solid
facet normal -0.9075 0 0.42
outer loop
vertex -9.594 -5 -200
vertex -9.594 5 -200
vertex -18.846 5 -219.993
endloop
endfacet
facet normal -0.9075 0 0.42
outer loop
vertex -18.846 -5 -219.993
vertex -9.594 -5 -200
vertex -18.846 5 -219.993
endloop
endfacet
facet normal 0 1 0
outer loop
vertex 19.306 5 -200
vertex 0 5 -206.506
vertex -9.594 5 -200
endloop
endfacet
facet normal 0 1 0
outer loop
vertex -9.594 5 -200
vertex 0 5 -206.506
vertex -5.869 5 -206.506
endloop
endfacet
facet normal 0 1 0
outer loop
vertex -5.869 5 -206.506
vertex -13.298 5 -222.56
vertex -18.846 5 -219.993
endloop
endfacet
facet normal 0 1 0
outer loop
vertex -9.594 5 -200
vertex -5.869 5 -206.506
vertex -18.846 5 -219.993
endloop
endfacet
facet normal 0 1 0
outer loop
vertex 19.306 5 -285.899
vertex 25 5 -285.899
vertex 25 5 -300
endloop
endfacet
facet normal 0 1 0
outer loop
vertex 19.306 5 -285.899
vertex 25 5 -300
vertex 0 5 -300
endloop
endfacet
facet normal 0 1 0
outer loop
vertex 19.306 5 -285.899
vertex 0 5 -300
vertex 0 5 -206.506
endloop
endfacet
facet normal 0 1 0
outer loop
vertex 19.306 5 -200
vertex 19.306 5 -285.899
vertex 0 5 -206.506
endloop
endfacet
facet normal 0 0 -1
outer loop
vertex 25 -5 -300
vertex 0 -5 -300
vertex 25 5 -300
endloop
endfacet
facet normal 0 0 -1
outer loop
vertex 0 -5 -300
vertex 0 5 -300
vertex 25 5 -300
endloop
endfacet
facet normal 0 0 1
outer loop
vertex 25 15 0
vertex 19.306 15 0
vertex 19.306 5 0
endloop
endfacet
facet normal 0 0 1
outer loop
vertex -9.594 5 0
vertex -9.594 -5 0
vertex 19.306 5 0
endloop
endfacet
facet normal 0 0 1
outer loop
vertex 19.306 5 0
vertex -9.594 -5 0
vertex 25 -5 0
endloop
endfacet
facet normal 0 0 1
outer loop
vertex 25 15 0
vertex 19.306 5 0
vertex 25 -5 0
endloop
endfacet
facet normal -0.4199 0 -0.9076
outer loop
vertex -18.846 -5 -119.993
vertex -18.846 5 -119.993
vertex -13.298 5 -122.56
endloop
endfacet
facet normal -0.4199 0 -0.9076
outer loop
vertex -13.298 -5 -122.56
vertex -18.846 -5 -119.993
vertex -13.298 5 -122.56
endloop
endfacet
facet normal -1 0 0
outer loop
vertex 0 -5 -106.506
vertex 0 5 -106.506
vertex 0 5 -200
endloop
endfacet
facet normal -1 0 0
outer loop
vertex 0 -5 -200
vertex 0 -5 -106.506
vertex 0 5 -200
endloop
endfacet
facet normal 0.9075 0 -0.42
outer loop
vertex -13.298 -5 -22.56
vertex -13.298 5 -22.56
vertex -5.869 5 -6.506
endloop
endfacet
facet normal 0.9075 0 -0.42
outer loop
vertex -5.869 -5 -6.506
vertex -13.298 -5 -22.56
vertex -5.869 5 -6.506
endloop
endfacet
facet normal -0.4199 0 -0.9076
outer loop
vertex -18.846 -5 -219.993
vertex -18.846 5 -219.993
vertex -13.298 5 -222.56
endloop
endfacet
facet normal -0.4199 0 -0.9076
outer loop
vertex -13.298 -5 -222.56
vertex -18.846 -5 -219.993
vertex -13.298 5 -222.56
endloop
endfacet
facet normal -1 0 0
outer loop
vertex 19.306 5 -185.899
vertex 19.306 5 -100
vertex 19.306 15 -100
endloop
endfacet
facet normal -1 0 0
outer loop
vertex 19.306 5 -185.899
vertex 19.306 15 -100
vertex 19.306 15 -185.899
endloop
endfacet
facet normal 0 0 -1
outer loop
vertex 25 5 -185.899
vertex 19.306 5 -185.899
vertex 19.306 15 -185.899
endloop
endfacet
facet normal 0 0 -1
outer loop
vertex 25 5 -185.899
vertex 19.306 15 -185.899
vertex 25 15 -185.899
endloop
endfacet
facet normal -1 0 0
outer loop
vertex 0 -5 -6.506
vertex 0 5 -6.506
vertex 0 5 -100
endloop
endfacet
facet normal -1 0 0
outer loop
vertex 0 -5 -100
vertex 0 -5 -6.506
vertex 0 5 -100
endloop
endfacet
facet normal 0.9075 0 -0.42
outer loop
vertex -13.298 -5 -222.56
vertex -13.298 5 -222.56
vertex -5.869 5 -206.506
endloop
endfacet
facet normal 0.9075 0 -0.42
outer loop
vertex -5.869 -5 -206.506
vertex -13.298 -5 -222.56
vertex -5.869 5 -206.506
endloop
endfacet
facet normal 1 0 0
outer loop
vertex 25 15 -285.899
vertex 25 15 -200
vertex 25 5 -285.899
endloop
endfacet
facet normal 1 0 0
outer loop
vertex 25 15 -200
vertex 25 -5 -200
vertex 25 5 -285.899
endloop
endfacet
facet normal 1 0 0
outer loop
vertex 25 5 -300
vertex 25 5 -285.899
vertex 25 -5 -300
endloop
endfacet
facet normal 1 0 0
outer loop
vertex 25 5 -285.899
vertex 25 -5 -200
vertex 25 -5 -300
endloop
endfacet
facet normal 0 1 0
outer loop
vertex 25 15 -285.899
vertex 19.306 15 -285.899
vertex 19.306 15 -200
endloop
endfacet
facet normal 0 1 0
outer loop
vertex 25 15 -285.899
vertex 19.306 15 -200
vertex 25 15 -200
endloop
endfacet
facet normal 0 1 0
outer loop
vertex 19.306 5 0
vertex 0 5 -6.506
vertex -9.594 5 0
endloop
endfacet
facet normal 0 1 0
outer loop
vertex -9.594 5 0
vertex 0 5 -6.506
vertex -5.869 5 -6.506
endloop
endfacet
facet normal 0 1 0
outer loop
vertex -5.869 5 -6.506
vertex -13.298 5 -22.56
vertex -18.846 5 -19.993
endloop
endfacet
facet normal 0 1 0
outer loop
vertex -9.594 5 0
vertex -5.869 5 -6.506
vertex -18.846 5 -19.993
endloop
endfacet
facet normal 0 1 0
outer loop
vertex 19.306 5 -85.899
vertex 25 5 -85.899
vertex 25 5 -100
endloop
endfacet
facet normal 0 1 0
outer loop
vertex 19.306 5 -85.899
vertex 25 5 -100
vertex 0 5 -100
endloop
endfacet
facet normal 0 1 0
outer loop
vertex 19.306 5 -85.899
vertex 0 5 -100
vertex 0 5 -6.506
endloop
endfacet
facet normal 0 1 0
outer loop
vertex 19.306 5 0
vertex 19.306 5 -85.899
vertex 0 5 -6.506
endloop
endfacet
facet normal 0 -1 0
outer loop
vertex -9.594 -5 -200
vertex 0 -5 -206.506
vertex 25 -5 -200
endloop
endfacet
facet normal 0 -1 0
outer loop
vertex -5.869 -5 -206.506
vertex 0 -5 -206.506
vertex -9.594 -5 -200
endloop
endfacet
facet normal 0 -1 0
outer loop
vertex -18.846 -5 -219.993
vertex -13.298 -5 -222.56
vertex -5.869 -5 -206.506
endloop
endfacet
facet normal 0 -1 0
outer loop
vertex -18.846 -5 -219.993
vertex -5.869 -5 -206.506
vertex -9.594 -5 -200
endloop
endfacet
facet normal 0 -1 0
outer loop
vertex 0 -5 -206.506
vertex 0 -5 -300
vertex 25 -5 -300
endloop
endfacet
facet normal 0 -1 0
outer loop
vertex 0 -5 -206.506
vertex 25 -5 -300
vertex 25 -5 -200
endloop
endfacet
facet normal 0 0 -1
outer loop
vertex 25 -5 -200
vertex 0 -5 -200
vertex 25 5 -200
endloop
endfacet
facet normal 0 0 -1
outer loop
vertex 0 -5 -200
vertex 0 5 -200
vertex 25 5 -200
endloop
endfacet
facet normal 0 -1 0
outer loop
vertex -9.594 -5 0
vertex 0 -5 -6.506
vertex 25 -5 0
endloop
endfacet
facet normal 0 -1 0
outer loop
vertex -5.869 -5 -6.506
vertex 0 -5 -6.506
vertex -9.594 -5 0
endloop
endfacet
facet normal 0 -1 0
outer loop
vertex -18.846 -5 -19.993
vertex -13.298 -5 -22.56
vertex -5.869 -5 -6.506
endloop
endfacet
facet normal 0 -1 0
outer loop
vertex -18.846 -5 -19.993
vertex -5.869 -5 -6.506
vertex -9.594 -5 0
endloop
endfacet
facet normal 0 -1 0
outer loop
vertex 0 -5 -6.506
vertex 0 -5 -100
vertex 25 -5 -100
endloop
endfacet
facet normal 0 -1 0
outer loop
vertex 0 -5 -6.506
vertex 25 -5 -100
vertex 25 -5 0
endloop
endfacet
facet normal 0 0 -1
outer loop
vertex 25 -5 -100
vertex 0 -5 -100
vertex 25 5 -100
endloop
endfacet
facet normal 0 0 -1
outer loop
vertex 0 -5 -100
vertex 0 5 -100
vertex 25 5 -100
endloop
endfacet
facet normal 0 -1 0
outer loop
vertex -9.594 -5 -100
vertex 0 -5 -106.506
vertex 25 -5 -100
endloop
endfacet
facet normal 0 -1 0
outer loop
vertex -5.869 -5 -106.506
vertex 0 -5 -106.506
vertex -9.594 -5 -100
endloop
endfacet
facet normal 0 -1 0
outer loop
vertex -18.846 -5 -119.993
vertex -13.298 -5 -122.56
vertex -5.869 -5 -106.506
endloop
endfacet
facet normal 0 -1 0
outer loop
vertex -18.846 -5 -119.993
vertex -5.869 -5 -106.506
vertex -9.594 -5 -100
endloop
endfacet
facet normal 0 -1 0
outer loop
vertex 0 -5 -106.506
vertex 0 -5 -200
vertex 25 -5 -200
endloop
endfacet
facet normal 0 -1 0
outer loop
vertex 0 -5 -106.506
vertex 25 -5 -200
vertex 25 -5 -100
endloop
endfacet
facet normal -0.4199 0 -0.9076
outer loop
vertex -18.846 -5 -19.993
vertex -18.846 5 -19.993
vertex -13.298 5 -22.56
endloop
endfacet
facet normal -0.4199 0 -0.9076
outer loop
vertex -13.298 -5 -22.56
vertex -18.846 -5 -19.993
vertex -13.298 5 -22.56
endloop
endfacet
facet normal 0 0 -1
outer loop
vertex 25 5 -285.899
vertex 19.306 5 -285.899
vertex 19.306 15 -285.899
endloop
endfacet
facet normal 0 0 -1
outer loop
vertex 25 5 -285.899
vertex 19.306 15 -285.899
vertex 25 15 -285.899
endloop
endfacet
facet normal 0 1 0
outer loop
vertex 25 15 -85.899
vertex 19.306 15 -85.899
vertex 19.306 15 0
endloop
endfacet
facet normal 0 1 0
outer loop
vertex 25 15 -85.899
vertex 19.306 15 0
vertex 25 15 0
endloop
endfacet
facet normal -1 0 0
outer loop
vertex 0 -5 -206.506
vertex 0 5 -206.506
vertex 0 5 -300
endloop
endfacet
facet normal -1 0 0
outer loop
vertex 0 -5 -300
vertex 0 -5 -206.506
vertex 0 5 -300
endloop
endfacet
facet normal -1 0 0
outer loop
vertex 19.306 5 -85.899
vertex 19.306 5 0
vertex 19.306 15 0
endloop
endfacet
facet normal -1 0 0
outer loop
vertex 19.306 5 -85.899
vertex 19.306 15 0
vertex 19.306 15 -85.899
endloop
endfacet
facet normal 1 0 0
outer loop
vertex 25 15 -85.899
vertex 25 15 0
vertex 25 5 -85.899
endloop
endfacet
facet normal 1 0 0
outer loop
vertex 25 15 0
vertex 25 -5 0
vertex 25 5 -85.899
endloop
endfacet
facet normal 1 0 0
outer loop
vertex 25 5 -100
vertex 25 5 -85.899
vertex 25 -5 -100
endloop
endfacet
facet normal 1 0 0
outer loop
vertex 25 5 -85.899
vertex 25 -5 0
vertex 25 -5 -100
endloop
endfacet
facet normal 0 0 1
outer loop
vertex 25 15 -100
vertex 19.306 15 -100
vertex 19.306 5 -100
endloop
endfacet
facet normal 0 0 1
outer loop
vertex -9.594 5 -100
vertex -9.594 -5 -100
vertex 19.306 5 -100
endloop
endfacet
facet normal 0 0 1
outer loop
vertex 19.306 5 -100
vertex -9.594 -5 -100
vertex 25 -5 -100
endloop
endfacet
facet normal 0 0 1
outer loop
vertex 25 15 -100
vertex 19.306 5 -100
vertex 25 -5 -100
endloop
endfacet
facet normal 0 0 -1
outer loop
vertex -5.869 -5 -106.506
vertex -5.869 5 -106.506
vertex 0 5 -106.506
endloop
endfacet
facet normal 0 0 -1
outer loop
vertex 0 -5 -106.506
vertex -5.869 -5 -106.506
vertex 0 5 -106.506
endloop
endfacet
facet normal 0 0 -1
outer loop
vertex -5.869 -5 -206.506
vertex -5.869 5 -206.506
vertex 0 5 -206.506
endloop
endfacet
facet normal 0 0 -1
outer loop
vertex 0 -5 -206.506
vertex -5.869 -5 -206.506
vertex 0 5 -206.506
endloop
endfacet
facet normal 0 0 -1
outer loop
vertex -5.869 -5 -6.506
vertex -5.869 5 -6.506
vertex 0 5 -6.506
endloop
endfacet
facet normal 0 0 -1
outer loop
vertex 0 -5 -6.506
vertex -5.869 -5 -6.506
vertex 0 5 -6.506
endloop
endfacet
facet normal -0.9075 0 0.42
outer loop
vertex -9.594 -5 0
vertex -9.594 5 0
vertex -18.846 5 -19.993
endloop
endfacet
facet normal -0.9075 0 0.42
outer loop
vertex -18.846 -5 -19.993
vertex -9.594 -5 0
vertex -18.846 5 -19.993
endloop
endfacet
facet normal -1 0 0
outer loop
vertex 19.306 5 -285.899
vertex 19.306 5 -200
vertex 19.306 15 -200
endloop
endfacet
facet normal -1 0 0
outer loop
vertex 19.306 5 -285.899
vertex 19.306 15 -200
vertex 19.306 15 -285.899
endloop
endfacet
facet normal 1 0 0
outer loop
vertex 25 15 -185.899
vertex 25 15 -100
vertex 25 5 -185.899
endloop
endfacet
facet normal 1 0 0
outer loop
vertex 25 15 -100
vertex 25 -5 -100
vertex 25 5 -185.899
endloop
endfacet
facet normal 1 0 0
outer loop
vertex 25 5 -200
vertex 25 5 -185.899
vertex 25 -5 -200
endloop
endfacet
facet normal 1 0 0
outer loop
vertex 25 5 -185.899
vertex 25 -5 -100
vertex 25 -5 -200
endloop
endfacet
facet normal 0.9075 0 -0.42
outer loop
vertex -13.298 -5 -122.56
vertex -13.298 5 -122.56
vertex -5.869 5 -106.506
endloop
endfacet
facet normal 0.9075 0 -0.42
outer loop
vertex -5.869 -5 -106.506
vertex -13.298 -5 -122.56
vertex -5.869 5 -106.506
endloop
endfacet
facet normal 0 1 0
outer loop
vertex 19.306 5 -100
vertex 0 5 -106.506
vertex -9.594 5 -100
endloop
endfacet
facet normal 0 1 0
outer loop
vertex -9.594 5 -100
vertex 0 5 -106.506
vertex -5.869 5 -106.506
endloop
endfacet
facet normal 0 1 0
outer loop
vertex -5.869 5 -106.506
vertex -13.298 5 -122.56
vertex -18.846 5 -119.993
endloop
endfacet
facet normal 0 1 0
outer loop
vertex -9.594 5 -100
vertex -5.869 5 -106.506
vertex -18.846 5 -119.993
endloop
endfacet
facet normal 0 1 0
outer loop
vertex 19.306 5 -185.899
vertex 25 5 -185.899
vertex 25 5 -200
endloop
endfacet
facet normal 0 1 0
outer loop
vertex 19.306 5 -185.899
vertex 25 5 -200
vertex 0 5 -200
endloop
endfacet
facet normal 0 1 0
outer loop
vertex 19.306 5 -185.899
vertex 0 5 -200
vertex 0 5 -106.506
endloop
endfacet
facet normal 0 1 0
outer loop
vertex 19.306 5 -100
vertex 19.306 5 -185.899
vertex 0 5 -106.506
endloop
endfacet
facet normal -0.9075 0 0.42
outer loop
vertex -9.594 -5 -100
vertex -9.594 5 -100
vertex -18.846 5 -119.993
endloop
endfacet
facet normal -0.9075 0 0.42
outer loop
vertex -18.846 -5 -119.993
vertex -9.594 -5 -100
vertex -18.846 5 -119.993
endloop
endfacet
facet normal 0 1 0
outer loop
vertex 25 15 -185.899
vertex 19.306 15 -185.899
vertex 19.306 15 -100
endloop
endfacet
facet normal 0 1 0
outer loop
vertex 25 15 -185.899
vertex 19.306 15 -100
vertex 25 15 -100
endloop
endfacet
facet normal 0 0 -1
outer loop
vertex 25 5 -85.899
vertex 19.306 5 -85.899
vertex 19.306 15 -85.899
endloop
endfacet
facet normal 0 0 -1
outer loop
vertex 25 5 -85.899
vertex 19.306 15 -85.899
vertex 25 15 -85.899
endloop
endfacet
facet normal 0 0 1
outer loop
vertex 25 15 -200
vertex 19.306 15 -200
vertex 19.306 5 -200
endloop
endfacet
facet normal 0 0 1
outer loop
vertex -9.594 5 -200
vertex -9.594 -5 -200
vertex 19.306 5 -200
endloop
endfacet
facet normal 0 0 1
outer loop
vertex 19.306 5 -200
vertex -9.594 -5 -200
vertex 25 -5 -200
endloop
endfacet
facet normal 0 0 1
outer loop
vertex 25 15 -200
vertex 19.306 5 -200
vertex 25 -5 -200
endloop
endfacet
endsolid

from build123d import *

# Parameters (mm, degrees)
SKIZZE1_W                       = 25
SKIZZE1_H                       = 100
AUFSATZ_LINEAR_AUSTRAGEN1_DEPTH = 5
AUFSATZ_LINEAR_AUSTRAGEN2_DEPTH = 10
SKIZZE4_W                       = 5.694336472
SKIZZE4_H                       = 85.898511164
AUFSATZ_LINEAR_AUSTRAGEN3_DEPTH = 10
LINEARES_MUSTER1_COUNT          = 3
LINEARES_MUSTER1_PITCH          = 100


with BuildPart() as part:
    # Skizze1 → Aufsatz-Linear austragen1 (new body, symmetric)
    with BuildSketch(Plane(origin=(0, 0, 0), x_dir=(1, 0, 0), z_dir=(0, 1, 0))):
        with Locations((12.5, 50)):
            Rectangle(SKIZZE1_W, SKIZZE1_H)
    extrude(amount=AUFSATZ_LINEAR_AUSTRAGEN1_DEPTH, both=True)

    # Skizze3 → Aufsatz-Linear austragen2 (add)
    with BuildSketch(Plane(origin=(0, 5, 0), x_dir=(1, 0, 0), z_dir=(0, 1, 0))):
        Polygon((0, 0), (-9.594253899, 0), (-18.845842309, 19.993203382), (-13.298383447, 22.560216038), (-5.869368316, 6.505696115), (0, 6.505696115), align=None)
    extrude(amount=-AUFSATZ_LINEAR_AUSTRAGEN2_DEPTH)

    # Skizze4 → Aufsatz-Linear austragen3 (add)
    with BuildSketch(Plane(origin=(0, 5, 0), x_dir=(1, 0, 0), z_dir=(0, 1, 0))):
        with Locations((22.152831764, 42.949255582)):
            Rectangle(SKIZZE4_W, SKIZZE4_H)
    extrude(amount=AUFSATZ_LINEAR_AUSTRAGEN3_DEPTH)


with BuildPart() as lineares_muster1_1:
    # Lineares Muster1: pattern copy
    add(part.part.moved(Location(Vector(0, 0, -1) * (1 * LINEARES_MUSTER1_PITCH))))


with BuildPart() as lineares_muster1_2:
    # Lineares Muster1: pattern copy
    add(part.part.moved(Location(Vector(0, 0, -1) * (2 * LINEARES_MUSTER1_PITCH))))


solid = Compound([part.part, lineares_muster1_1.part, lineares_muster1_2.part])
